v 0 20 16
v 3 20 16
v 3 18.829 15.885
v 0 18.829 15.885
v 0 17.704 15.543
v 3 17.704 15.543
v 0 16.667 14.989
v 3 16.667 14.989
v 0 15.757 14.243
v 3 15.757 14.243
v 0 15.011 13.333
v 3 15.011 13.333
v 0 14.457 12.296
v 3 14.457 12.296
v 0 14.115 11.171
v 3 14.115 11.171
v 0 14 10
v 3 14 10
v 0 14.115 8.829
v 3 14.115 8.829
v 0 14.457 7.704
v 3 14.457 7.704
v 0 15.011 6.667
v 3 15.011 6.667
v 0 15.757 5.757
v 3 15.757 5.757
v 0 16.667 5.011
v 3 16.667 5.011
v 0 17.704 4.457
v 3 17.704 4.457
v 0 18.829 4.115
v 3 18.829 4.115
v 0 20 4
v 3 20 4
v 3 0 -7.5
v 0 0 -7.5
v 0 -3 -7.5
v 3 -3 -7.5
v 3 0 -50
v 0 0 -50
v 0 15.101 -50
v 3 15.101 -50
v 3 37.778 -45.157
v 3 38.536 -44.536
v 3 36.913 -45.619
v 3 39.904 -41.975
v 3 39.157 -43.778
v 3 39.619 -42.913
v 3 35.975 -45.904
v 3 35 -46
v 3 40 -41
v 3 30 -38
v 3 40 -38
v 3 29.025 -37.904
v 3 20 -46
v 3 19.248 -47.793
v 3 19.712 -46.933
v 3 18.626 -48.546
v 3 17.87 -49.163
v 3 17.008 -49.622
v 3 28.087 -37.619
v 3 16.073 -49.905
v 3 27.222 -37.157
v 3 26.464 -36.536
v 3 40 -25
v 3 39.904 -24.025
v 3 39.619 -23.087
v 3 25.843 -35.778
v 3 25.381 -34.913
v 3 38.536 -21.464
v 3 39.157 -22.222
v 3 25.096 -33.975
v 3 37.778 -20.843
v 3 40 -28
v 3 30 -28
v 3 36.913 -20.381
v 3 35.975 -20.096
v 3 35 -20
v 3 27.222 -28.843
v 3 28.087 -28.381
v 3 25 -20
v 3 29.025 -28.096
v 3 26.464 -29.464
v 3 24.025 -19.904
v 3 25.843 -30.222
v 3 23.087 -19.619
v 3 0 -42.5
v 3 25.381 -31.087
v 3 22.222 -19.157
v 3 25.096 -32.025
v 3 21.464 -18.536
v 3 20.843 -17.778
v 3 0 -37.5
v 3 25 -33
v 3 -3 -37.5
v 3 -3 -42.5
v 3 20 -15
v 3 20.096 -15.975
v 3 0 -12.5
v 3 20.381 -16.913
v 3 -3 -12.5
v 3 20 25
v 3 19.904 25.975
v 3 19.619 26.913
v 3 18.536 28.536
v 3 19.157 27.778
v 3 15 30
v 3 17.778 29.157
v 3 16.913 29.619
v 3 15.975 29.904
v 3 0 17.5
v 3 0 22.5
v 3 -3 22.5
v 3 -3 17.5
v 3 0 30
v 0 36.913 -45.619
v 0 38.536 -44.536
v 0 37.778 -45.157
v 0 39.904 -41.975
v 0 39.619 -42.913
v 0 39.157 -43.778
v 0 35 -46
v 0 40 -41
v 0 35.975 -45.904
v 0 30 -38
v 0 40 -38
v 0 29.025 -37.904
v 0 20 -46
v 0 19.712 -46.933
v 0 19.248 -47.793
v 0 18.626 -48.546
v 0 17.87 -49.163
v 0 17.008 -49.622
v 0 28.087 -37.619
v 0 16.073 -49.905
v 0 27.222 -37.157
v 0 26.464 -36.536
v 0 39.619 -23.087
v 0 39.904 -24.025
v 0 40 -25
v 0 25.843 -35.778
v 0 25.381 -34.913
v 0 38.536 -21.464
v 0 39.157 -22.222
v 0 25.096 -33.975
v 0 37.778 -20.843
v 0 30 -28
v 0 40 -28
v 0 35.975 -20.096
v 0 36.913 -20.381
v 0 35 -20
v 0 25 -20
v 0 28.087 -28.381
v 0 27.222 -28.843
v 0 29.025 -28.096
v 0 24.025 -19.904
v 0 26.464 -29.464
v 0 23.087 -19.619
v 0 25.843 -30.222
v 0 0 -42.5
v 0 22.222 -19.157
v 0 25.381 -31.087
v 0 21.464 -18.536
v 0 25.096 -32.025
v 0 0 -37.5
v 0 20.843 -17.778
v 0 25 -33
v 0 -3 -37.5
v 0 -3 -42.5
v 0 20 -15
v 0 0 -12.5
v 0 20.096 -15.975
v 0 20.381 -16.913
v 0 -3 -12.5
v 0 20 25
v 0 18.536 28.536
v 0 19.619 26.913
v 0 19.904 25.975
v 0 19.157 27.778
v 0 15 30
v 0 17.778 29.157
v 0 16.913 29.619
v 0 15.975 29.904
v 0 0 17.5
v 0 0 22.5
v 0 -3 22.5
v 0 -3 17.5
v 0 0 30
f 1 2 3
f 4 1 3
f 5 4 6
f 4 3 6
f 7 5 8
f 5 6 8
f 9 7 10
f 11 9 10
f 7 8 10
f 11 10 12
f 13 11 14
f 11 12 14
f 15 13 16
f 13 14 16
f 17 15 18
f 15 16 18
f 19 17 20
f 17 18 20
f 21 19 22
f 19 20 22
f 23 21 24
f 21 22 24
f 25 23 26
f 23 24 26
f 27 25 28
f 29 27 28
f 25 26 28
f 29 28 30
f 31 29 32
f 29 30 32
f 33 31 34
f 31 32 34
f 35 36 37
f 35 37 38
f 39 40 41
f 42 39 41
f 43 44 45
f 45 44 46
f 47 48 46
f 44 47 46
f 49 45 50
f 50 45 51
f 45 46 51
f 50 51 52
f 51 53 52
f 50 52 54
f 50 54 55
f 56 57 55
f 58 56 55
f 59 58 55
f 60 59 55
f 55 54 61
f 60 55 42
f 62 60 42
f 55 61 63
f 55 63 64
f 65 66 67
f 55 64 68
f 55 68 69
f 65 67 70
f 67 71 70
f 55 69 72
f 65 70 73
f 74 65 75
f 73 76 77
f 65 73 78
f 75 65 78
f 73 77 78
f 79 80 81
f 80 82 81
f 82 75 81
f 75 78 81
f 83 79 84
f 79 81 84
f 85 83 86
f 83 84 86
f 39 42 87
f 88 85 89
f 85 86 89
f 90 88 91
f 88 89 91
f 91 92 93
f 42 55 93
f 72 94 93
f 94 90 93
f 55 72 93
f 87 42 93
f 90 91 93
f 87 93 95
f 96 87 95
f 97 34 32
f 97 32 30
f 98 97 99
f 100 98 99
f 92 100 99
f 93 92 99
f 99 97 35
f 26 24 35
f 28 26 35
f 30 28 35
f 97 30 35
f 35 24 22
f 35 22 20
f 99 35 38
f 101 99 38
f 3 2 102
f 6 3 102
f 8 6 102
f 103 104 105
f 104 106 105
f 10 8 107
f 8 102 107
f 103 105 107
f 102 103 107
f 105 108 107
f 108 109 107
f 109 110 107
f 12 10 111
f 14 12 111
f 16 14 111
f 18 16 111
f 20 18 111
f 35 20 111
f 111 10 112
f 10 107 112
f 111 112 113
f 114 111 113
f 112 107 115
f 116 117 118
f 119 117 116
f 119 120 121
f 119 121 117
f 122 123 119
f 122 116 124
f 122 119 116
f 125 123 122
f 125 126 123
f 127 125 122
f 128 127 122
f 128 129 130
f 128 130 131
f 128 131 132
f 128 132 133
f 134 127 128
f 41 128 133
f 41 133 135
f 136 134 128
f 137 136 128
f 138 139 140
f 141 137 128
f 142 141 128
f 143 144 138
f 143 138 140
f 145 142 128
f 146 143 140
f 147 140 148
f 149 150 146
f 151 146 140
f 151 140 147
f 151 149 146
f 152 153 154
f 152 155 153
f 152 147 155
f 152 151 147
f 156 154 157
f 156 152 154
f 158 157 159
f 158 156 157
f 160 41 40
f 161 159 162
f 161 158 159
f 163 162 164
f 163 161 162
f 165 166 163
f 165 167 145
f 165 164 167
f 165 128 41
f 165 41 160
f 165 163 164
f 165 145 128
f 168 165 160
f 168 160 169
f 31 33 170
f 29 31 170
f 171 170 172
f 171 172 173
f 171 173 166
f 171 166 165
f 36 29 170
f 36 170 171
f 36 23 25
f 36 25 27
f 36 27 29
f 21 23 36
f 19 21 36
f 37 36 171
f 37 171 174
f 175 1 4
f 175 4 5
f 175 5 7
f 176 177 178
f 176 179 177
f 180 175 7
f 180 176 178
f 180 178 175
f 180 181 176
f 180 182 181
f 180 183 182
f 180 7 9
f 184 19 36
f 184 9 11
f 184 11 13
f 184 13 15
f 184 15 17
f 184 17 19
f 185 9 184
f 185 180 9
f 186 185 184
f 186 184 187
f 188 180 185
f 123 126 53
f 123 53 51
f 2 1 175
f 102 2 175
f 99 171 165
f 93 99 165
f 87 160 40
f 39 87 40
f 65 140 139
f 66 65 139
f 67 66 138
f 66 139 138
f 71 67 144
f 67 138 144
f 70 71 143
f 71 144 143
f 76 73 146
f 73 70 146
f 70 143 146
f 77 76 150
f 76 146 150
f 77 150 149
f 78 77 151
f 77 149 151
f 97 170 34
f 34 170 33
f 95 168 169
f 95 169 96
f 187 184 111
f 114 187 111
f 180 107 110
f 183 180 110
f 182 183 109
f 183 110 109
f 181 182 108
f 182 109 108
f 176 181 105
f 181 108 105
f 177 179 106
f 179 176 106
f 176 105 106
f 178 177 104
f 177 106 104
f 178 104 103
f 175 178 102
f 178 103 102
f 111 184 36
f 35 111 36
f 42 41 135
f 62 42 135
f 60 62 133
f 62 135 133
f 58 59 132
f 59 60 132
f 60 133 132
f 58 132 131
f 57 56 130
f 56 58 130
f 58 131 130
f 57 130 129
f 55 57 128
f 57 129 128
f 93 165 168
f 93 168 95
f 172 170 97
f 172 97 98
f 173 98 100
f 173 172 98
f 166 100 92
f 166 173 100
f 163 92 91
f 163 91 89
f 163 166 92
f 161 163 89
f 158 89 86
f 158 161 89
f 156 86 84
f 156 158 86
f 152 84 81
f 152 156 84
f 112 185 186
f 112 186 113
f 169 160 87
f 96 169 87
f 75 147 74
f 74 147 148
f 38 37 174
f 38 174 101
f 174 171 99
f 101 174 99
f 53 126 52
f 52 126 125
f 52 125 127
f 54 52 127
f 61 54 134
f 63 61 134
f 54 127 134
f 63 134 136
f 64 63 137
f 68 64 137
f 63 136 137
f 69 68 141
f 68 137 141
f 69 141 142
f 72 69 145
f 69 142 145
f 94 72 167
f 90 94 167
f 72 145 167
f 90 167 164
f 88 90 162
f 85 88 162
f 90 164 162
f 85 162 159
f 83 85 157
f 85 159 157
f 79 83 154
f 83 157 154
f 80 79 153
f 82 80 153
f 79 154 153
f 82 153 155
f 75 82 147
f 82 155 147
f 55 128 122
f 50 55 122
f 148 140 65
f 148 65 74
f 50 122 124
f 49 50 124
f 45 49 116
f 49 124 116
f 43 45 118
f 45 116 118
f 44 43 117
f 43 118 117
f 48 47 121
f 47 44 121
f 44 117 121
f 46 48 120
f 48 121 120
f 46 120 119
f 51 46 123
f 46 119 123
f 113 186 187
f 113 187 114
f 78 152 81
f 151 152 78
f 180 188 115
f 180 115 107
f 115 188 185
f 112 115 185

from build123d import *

# Parameters (mm, degrees)
SKETCH1_W           = 80
SKETCH1_H           = 40
BOSS_EXTRUDE1_DEPTH = 3
SKETCH2_R           = 6
CUT_EXTRUDE1_DEPTH  = 65.101482042
SKETCH5_W           = 4
SKETCH5_H           = 20
SKETCH5_W_2         = 51.247459446
CUT_EXTRUDE2_DEPTH  = 65.101482042
FILLET1_R           = 5
SKETCH6_W           = 3
SKETCH6_H           = 5
BOSS_EXTRUDE2_DEPTH = 3
LPATTERN1_COUNT     = 3
LPATTERN1_PITCH     = 30


with BuildPart() as part:
    # Sketch1 → Boss-Extrude1 (new body)
    with BuildSketch(Plane(origin=(0, 0, 0), x_dir=(0, 0, -1), z_dir=(1, 0, 0))):
        with Locations((10, 20)):
            Rectangle(SKETCH1_W, SKETCH1_H)
    extrude(amount=BOSS_EXTRUDE1_DEPTH)

    # Sketch2 → Cut-Extrude1 (cut, through all)
    with BuildSketch(Plane(origin=(3, 0, 0), x_dir=(0, 0, -1), z_dir=(1, 0, 0))):
        with Locations((-10, 20)):
            Circle(SKETCH2_R)
    extrude(amount=-CUT_EXTRUDE1_DEPTH, mode=Mode.SUBTRACT)

    # Sketch5 → Cut-Extrude2 (cut, through all)
    with BuildSketch(Plane.ZY):
        with BuildLine():
            Line((-28, 30), (-28, 40))
            Line((-28, 40), (-38, 40))
            Line((-38, 40), (-38, 30))
            ThreePointArc((-38, 30), (-33, 25), (-28, 30))
        make_face()
        with Locations((-48, 30)):
            Rectangle(SKETCH5_W, SKETCH5_H)
        with Locations((5.623729723, 30)):
            Rectangle(SKETCH5_W_2, SKETCH5_H)
    extrude(amount=-CUT_EXTRUDE2_DEPTH, mode=Mode.SUBTRACT)

    # Fillet1
    # the kernel refuses this fillet: 5 mm, written as the material it adds along each edge
    with BuildSketch(Plane(origin=(0, 20, -20), x_dir=(0, 1, 0), z_dir=(1, 0, 0))) as fillet1_piece_1:
        with BuildLine():
            CenterArc((FILLET1_R, FILLET1_R), FILLET1_R, 180, 90)
            Line((0, FILLET1_R), (0, 0))
            Line((0, 0), (FILLET1_R, 0))
        make_face()
    extrude(amount=3)
    # the kernel refuses this fillet: 5 mm, written as the material it takes off along each edge
    with BuildSketch(Plane(origin=(-12.5, 40, -46), x_dir=(0, -1, 0), z_dir=(1, 0, 0)), Plane(origin=(-12.5, 40, -20), x_dir=(0, 0, -1), z_dir=(1, 0, 0)), Plane(origin=(15.5, 20, 30), x_dir=(0, -1, 0), z_dir=(-1, 0, 0))) as fillet1_2_piece_1:
        with BuildLine():
            CenterArc((FILLET1_R, -FILLET1_R), FILLET1_R, 90, 90)
            Line((0, -FILLET1_R), (0, 0))
            Line((0, 0), (FILLET1_R, 0))
        make_face()
    extrude(amount=28, mode=Mode.SUBTRACT)
    with BuildSketch(Plane(origin=(-12.247448714, 20, -50), x_dir=(0, -1, 0), z_dir=(1, 0, 0))) as fillet1_2_piece_2:
        with BuildLine():
            CenterArc((4.898979486, -5), FILLET1_R, 90, 78.463040967)
            Line((0, -4), (0, 0))
            Line((0, 0), (4.898979486, 0))
        make_face()
    extrude(amount=27.494897428, mode=Mode.SUBTRACT)

    # Sketch6 → Boss-Extrude2 (add)
    with BuildSketch(Plane.XZ):
        with Locations((1.5, 20)):
            Rectangle(SKETCH6_W, SKETCH6_H)
    boss_extrude2 = extrude(amount=BOSS_EXTRUDE2_DEPTH)

    # LPattern1: Boss-Extrude2 ×3
    with Locations(*[(0, 0, -i * LPATTERN1_PITCH) for i in range(1, LPATTERN1_COUNT)]):
        add(boss_extrude2)


solid = part.part
